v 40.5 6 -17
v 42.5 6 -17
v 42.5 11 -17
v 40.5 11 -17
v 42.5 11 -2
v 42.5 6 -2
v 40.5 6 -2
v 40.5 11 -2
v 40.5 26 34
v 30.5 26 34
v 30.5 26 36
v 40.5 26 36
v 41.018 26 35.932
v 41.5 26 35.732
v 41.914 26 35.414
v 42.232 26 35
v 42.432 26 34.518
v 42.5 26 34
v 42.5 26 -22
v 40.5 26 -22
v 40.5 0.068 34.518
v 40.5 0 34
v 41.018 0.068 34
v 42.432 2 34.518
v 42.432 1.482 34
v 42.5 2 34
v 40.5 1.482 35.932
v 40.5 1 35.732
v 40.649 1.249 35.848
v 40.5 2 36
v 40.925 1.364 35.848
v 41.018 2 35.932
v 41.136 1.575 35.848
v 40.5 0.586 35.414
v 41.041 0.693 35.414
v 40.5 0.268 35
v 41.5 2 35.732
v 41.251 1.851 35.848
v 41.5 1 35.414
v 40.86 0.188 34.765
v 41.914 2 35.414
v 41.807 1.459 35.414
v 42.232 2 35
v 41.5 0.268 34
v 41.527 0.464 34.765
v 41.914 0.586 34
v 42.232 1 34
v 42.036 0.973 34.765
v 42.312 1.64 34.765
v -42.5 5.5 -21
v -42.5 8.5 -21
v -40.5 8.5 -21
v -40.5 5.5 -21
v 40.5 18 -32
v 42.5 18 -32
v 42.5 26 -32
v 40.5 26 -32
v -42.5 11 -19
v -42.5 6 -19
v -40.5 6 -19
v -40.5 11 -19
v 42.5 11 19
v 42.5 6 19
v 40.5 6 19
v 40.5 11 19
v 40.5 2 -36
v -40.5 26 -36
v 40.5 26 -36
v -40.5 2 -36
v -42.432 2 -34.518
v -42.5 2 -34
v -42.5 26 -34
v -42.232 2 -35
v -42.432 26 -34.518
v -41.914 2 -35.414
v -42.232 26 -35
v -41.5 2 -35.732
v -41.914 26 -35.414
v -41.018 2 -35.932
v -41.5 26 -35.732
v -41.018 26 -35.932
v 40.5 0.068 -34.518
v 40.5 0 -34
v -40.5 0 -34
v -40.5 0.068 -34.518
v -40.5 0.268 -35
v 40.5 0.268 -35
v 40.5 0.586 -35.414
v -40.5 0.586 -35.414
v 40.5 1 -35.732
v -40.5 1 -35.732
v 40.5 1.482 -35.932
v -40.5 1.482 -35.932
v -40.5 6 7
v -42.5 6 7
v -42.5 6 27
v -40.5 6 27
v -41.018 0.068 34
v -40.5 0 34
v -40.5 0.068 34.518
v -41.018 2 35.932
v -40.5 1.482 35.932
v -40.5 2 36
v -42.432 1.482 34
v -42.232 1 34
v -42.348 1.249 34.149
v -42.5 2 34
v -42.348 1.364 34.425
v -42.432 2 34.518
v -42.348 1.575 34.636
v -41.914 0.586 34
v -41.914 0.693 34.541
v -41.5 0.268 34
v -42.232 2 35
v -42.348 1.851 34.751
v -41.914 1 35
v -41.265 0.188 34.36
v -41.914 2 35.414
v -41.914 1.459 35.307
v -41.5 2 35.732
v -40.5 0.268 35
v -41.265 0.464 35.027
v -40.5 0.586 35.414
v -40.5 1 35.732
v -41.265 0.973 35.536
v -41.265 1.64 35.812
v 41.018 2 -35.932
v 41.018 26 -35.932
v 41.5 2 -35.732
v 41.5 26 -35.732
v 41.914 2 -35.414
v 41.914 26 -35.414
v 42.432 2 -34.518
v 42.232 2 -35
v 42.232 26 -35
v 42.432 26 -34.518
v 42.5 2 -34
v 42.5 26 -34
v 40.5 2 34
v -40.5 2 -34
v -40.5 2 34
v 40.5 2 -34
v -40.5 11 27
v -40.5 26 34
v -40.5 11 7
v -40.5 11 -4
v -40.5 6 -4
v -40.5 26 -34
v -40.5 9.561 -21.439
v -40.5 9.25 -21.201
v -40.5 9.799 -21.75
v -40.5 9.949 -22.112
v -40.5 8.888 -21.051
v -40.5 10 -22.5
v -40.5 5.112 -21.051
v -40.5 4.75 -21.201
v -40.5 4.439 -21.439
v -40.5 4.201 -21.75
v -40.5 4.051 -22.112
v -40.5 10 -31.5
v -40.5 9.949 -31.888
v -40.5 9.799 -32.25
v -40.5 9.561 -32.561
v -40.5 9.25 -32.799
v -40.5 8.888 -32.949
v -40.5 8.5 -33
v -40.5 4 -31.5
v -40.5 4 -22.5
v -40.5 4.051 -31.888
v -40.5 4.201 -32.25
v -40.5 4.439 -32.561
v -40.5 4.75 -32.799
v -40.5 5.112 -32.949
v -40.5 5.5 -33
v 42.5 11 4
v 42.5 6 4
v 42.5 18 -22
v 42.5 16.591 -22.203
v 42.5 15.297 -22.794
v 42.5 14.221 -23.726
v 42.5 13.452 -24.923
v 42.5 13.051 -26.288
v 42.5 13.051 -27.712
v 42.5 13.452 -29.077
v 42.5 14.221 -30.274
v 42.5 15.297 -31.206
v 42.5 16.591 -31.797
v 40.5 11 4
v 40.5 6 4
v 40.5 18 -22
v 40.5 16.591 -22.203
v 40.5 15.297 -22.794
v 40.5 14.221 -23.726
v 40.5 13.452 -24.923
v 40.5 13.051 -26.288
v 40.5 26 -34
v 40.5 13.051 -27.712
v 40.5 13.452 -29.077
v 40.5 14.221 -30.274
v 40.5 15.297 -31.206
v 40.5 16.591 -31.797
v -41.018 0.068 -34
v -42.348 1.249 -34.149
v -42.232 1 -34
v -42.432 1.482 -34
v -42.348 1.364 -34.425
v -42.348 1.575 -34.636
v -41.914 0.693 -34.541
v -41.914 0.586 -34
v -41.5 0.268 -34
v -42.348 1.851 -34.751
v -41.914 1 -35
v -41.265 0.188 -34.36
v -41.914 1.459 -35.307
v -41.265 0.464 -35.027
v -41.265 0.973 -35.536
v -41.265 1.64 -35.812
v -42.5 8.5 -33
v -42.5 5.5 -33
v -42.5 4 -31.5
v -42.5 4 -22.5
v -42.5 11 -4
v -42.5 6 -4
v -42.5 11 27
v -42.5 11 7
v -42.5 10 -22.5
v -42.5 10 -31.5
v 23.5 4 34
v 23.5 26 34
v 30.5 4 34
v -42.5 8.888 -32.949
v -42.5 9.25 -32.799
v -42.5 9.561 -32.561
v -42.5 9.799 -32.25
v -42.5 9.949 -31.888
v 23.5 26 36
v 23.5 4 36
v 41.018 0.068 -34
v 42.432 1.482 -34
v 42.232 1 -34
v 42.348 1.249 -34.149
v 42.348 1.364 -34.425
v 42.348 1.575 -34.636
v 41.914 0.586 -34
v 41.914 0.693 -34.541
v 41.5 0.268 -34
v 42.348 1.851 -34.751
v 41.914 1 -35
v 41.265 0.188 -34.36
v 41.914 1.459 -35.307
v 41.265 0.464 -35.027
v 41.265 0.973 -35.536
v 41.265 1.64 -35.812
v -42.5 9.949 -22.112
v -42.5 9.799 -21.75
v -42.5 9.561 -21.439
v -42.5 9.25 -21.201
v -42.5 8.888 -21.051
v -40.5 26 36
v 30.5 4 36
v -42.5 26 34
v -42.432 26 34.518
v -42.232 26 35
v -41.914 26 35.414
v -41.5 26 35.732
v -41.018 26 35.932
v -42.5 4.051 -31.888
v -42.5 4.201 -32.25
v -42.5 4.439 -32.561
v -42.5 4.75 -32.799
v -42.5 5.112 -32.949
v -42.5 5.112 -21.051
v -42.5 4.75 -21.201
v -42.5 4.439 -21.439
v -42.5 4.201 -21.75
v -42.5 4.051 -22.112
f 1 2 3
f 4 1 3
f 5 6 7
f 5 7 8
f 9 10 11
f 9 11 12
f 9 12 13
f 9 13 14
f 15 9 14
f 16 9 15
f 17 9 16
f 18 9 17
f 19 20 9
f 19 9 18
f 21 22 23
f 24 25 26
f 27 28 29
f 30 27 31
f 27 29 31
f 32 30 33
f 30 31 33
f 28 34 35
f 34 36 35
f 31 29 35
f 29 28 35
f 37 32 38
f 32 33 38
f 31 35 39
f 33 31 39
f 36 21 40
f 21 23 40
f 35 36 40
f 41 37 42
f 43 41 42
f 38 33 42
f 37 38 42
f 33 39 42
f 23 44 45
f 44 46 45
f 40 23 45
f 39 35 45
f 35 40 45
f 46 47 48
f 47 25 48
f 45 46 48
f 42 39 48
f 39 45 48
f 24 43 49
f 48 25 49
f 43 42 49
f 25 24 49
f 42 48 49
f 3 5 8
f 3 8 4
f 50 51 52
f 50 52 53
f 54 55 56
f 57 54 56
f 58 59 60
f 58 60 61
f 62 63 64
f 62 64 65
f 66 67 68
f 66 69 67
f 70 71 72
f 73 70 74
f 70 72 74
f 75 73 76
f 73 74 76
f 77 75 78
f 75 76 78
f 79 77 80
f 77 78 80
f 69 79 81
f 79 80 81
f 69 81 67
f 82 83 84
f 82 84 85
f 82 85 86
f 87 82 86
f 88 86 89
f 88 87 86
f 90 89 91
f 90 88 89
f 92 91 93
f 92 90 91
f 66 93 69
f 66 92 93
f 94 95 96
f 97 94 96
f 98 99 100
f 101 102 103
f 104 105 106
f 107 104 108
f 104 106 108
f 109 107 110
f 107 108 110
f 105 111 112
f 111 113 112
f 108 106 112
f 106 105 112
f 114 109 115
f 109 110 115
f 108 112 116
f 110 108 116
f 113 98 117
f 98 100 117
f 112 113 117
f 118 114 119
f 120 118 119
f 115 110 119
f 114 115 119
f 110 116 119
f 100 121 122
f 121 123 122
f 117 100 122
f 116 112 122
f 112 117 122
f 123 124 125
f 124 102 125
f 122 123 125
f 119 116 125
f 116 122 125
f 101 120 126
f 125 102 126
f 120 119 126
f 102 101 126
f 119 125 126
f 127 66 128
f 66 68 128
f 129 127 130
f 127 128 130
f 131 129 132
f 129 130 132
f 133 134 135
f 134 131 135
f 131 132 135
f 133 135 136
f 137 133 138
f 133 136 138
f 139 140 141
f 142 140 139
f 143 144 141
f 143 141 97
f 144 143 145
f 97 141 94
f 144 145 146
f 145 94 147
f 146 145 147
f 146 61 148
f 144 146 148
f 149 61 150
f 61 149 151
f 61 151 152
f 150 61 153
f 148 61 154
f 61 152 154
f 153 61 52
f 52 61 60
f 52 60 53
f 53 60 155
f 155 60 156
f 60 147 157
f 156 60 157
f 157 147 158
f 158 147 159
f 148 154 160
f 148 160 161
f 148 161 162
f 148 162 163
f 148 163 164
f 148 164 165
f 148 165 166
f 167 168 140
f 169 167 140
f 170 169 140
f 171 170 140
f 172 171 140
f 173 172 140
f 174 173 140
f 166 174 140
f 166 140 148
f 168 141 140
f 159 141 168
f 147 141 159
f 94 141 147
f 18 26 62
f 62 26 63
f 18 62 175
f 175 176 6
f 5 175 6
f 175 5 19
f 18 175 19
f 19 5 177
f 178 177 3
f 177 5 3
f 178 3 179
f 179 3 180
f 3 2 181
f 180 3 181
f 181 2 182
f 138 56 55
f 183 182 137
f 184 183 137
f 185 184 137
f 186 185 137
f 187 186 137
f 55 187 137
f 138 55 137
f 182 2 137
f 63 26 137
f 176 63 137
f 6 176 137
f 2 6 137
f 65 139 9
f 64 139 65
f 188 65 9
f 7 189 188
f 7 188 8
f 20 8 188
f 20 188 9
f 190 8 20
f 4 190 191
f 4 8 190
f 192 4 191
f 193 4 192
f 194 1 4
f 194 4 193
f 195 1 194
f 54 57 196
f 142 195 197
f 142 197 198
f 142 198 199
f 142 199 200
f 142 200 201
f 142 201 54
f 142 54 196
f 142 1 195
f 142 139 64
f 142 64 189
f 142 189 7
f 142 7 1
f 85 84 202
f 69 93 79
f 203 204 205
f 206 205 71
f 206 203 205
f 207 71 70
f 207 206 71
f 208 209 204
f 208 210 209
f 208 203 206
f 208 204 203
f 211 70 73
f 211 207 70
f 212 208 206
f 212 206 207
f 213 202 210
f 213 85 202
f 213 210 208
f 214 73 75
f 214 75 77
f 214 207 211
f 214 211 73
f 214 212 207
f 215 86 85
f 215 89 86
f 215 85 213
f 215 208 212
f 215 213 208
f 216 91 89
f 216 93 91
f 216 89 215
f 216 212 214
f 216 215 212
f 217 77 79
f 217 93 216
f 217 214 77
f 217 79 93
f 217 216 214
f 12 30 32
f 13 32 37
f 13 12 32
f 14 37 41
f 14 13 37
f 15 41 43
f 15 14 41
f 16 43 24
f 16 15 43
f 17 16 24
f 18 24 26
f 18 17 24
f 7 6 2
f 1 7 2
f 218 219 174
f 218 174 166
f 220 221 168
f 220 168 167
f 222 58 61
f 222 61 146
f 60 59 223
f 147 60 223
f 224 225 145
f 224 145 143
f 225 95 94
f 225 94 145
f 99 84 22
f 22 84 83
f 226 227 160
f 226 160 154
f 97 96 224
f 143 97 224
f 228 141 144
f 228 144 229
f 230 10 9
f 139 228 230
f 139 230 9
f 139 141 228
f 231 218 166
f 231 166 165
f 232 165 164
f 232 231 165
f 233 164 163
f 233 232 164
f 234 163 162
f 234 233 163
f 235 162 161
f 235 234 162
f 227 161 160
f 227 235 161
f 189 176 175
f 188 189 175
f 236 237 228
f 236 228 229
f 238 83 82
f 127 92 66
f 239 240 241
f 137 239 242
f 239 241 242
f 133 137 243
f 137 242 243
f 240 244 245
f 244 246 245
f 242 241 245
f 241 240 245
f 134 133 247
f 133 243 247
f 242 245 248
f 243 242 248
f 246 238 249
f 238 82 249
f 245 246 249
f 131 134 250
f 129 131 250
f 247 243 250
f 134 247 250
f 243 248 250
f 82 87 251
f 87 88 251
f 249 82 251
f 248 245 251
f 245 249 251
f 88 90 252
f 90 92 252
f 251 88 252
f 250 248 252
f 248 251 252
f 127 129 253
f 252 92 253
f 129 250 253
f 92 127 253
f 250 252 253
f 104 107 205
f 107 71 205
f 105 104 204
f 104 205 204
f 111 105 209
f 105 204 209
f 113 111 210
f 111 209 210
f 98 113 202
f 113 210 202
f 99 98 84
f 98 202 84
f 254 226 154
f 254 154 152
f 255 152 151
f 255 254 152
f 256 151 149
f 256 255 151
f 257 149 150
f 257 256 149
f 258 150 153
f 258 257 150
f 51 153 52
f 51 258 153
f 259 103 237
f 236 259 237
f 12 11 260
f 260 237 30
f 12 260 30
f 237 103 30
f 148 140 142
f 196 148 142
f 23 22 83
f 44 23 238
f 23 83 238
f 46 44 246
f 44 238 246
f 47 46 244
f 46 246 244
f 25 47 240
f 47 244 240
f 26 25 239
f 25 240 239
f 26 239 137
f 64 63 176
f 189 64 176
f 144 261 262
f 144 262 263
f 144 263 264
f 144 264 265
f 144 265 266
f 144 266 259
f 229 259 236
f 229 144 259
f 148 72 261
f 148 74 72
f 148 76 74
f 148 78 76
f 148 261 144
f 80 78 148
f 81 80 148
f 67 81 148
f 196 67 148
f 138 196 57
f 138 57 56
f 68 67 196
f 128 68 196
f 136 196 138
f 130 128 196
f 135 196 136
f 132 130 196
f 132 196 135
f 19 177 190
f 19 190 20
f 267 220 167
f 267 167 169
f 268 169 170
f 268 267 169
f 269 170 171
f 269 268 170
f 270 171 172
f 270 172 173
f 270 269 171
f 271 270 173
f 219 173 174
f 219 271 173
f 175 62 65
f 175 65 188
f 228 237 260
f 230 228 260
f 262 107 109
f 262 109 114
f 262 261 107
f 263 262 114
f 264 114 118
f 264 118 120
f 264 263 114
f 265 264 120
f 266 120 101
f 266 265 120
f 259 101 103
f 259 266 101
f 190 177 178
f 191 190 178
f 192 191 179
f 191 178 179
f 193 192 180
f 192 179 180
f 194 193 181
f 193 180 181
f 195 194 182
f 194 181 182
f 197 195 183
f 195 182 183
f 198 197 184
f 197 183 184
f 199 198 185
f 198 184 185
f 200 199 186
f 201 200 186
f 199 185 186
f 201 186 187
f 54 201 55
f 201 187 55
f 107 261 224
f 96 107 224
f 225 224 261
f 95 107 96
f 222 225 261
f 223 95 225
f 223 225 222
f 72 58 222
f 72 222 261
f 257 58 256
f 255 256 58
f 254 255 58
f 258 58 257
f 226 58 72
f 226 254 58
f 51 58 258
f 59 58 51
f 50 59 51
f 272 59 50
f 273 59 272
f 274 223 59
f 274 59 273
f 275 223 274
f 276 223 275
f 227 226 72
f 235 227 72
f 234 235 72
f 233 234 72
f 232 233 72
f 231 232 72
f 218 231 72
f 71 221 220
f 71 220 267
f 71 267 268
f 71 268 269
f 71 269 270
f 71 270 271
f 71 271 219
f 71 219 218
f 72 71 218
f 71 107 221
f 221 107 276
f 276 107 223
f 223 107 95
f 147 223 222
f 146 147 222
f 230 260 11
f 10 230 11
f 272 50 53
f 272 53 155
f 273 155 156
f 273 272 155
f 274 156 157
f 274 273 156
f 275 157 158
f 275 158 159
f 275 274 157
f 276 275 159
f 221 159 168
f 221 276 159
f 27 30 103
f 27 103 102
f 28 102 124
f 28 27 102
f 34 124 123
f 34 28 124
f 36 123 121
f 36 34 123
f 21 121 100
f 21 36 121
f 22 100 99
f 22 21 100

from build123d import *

# Parameters (mm, degrees)
ESQUISSE1_W             = 85
ESQUISSE1_H             = 72
BOSS_EXTRU_1_DEPTH      = 26
COQUE1_T                = -2
ESQUISSE2_R             = 5
ESQUISSE2_W             = 10
ESQUISSE2_H             = 8
ENL_V_MAT_EXTRU_1_DEPTH = 2
ESQUISSE3_W             = 15
ESQUISSE3_H             = 5
ENL_V_MAT_EXTRU_2_DEPTH = 2
ESQUISSE4_W             = 7
ESQUISSE4_H             = 22
ENL_V_MAT_EXTRU_3_DEPTH = 2
ESQUISSE5_W             = 20
ESQUISSE5_H             = 5
ENL_V_MAT_EXTRU_4_DEPTH = 2
ESQUISSE6_W             = 15
ESQUISSE6_H             = 5
ENL_V_MAT_EXTRU_5_DEPTH = 2
ENL_V_MAT_EXTRU_7_DEPTH = 2
CONG_1_R                = 2


with BuildPart() as part:
    # Esquisse1 → Boss.-Extru.1 (new body)
    with BuildSketch(Plane(origin=(0, 0, 0), x_dir=(1, 0, 0), z_dir=(0, 1, 0))):
        Rectangle(ESQUISSE1_W, ESQUISSE1_H)
    extrude(amount=BOSS_EXTRU_1_DEPTH)

    # Coque1
    coque1_openings = [part.faces().sort_by_distance(p)[0] for p in [
        (0, 26, 0),
    ]]
    offset(amount=COQUE1_T, openings=coque1_openings, kind=Kind.INTERSECTION)

    # Esquisse2 → Enlèv. mat.-Extru.1 (cut)
    with BuildSketch(Plane(origin=(42.5, 0, 0), x_dir=(0, 0, -1), z_dir=(1, 0, 0))):
        with Locations((27, 18)):
            Circle(ESQUISSE2_R)
        with Locations((27, 22)):
            Rectangle(ESQUISSE2_W, ESQUISSE2_H)
    extrude(amount=-ENL_V_MAT_EXTRU_1_DEPTH, mode=Mode.SUBTRACT)

    # Esquisse3 → Enlèv. mat.-Extru.2 (cut)
    with BuildSketch(Plane(origin=(42.5, 0, 0), x_dir=(0, 0, -1), z_dir=(1, 0, 0))):
        with Locations((9.5, 8.5)):
            Rectangle(ESQUISSE3_W, ESQUISSE3_H)
        with Locations((-11.5, 8.5)):
            Rectangle(ESQUISSE3_W, ESQUISSE3_H)
    extrude(amount=-ENL_V_MAT_EXTRU_2_DEPTH, mode=Mode.SUBTRACT)

    # Esquisse4 → Enlèv. mat.-Extru.3 (cut)
    with BuildSketch(Plane.XY.offset(36)):
        with Locations((27, 15)):
            Rectangle(ESQUISSE4_W, ESQUISSE4_H)
    extrude(amount=-ENL_V_MAT_EXTRU_3_DEPTH, mode=Mode.SUBTRACT)

    # Esquisse5 → Enlèv. mat.-Extru.4 (cut)
    with BuildSketch(Plane.ZY.offset(42.5)):
        with Locations((17, 8.5)):
            Rectangle(ESQUISSE5_W, ESQUISSE5_H)
    extrude(amount=-ENL_V_MAT_EXTRU_4_DEPTH, mode=Mode.SUBTRACT)

    # Esquisse6 → Enlèv. mat.-Extru.5 (cut)
    with BuildSketch(Plane.ZY.offset(42.5)):
        with Locations((-11.5, 8.5)):
            Rectangle(ESQUISSE6_W, ESQUISSE6_H)
    extrude(amount=-ENL_V_MAT_EXTRU_5_DEPTH, mode=Mode.SUBTRACT)

    # Esquisse8 → Enlèv. mat.-Extru.7 (cut)
    with BuildSketch(Plane.ZY.offset(42.5)):
        with BuildLine():
            Line((-31.5, 10), (-22.5, 10))
            ThreePointArc((-22.5, 10), (-21.439339828, 9.560660172), (-21, 8.5))
            Line((-21, 8.5), (-21, 5.5))
            ThreePointArc((-21, 5.5), (-21.439339828, 4.439339828), (-22.5, 4))
            Line((-22.5, 4), (-31.5, 4))
            ThreePointArc((-31.5, 4), (-32.560660172, 4.439339828), (-33, 5.5))
            Line((-33, 5.5), (-33, 8.5))
            ThreePointArc((-33, 8.5), (-32.560660172, 9.560660172), (-31.5, 10))
        make_face()
    extrude(amount=-ENL_V_MAT_EXTRU_7_DEPTH, mode=Mode.SUBTRACT)

    # Congé1
    cong_1_edges = [part.edges().sort_by_distance(p)[0] for p in [
        (0, 0, -36),
        (42.5, 0, 0),
        (0, 0, 36),
        (-42.5, 0, 0),
        (-42.5, 13, -36),
        (42.5, 13, -36),
        (42.5, 13, 36),
        (-42.5, 13, 36),
    ]]
    fillet(cong_1_edges, radius=CONG_1_R)


solid = part.part
